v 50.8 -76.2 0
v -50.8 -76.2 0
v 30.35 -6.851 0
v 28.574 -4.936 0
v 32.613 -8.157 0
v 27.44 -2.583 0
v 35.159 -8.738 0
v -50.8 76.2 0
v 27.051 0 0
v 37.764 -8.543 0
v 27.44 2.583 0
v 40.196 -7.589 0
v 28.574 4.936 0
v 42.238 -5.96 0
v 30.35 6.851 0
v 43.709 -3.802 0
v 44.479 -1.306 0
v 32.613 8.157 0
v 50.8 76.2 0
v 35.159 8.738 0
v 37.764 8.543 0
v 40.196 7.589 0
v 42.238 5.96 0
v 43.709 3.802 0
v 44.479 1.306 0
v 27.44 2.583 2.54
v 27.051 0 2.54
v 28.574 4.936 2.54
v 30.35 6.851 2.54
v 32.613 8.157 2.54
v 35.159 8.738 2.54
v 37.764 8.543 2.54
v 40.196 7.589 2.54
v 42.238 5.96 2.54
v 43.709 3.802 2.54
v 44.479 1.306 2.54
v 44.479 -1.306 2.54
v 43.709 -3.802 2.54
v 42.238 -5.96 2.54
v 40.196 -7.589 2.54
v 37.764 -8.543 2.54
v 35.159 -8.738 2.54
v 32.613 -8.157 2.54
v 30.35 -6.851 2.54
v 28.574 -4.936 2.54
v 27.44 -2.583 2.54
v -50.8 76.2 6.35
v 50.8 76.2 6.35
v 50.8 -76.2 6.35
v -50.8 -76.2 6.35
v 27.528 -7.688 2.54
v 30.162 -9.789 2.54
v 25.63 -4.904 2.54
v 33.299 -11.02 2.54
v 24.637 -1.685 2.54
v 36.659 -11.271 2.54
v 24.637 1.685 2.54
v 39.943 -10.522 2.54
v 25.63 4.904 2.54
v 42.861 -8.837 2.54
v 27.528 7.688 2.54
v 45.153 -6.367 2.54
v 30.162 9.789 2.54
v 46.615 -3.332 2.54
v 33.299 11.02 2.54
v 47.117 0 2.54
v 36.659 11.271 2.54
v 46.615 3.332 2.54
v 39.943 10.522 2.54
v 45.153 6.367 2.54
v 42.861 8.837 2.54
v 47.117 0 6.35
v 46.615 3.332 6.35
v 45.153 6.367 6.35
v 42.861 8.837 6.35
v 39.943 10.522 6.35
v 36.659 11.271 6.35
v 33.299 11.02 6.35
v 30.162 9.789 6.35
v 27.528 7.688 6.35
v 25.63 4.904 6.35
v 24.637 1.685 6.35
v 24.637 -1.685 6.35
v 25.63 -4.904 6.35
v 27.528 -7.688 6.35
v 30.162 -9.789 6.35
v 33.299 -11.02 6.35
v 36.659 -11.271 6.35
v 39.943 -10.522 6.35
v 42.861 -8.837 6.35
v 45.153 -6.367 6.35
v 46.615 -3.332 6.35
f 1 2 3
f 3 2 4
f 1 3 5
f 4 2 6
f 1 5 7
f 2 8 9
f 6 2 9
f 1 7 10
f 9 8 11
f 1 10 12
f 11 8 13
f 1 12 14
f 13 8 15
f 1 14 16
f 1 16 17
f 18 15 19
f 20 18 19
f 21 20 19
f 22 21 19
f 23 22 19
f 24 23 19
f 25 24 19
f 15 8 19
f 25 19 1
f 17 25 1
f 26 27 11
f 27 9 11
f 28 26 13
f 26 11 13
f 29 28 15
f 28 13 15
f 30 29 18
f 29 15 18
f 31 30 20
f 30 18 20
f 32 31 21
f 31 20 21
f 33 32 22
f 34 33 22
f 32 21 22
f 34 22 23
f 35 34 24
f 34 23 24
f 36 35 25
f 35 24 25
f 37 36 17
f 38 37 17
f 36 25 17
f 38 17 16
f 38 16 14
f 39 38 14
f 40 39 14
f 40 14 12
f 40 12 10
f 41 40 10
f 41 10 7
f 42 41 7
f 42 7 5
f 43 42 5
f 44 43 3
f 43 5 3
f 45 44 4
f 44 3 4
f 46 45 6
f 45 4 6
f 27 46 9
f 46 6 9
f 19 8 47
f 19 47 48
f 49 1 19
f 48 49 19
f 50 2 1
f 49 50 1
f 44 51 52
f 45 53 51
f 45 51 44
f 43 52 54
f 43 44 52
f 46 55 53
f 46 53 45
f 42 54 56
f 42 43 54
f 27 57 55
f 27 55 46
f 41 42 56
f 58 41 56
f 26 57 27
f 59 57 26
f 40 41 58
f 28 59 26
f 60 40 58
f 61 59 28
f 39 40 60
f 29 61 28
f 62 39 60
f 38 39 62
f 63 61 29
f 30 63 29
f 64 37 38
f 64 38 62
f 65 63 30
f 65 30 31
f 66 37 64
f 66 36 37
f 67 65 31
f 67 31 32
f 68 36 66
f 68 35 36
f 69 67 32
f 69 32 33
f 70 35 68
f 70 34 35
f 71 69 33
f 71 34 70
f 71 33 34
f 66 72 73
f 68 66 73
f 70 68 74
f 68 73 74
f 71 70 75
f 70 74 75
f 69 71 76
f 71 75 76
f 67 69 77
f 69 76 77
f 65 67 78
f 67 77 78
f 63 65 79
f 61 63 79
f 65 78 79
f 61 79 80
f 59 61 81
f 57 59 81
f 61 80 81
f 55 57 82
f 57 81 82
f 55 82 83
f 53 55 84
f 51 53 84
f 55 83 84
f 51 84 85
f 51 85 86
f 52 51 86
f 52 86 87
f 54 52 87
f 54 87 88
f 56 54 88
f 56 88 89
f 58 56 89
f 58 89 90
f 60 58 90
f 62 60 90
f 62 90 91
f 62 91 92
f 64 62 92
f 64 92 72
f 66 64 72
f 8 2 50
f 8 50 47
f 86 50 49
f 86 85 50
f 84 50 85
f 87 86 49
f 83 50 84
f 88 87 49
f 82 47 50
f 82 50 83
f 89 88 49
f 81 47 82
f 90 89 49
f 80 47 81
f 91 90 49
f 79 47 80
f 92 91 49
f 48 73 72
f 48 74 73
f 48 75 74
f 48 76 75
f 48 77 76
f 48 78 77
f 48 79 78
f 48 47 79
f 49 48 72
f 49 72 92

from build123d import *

# Parameters (mm, degrees)
F0_W           = 101.6
F0_H           = 152.4
F1_DEPTH       = 6.35
F3_D           = 17.526
F3_CBORE_D     = 22.606
F3_CBORE_DEPTH = 3.81


with BuildPart() as f1:
    # F0 (on Top) → F1 (new body)
    with BuildSketch(Plane.XY):
        Rectangle(F0_W, F0_H)
    extrude(amount=F1_DEPTH)

    # F3 (through all)
    with Locations(Plane.XY.offset(6.35)):
        with Locations((35.814, 0)):
            CounterBoreHole(F3_D / 2, F3_CBORE_D / 2, F3_CBORE_DEPTH)


solid = f1.part
